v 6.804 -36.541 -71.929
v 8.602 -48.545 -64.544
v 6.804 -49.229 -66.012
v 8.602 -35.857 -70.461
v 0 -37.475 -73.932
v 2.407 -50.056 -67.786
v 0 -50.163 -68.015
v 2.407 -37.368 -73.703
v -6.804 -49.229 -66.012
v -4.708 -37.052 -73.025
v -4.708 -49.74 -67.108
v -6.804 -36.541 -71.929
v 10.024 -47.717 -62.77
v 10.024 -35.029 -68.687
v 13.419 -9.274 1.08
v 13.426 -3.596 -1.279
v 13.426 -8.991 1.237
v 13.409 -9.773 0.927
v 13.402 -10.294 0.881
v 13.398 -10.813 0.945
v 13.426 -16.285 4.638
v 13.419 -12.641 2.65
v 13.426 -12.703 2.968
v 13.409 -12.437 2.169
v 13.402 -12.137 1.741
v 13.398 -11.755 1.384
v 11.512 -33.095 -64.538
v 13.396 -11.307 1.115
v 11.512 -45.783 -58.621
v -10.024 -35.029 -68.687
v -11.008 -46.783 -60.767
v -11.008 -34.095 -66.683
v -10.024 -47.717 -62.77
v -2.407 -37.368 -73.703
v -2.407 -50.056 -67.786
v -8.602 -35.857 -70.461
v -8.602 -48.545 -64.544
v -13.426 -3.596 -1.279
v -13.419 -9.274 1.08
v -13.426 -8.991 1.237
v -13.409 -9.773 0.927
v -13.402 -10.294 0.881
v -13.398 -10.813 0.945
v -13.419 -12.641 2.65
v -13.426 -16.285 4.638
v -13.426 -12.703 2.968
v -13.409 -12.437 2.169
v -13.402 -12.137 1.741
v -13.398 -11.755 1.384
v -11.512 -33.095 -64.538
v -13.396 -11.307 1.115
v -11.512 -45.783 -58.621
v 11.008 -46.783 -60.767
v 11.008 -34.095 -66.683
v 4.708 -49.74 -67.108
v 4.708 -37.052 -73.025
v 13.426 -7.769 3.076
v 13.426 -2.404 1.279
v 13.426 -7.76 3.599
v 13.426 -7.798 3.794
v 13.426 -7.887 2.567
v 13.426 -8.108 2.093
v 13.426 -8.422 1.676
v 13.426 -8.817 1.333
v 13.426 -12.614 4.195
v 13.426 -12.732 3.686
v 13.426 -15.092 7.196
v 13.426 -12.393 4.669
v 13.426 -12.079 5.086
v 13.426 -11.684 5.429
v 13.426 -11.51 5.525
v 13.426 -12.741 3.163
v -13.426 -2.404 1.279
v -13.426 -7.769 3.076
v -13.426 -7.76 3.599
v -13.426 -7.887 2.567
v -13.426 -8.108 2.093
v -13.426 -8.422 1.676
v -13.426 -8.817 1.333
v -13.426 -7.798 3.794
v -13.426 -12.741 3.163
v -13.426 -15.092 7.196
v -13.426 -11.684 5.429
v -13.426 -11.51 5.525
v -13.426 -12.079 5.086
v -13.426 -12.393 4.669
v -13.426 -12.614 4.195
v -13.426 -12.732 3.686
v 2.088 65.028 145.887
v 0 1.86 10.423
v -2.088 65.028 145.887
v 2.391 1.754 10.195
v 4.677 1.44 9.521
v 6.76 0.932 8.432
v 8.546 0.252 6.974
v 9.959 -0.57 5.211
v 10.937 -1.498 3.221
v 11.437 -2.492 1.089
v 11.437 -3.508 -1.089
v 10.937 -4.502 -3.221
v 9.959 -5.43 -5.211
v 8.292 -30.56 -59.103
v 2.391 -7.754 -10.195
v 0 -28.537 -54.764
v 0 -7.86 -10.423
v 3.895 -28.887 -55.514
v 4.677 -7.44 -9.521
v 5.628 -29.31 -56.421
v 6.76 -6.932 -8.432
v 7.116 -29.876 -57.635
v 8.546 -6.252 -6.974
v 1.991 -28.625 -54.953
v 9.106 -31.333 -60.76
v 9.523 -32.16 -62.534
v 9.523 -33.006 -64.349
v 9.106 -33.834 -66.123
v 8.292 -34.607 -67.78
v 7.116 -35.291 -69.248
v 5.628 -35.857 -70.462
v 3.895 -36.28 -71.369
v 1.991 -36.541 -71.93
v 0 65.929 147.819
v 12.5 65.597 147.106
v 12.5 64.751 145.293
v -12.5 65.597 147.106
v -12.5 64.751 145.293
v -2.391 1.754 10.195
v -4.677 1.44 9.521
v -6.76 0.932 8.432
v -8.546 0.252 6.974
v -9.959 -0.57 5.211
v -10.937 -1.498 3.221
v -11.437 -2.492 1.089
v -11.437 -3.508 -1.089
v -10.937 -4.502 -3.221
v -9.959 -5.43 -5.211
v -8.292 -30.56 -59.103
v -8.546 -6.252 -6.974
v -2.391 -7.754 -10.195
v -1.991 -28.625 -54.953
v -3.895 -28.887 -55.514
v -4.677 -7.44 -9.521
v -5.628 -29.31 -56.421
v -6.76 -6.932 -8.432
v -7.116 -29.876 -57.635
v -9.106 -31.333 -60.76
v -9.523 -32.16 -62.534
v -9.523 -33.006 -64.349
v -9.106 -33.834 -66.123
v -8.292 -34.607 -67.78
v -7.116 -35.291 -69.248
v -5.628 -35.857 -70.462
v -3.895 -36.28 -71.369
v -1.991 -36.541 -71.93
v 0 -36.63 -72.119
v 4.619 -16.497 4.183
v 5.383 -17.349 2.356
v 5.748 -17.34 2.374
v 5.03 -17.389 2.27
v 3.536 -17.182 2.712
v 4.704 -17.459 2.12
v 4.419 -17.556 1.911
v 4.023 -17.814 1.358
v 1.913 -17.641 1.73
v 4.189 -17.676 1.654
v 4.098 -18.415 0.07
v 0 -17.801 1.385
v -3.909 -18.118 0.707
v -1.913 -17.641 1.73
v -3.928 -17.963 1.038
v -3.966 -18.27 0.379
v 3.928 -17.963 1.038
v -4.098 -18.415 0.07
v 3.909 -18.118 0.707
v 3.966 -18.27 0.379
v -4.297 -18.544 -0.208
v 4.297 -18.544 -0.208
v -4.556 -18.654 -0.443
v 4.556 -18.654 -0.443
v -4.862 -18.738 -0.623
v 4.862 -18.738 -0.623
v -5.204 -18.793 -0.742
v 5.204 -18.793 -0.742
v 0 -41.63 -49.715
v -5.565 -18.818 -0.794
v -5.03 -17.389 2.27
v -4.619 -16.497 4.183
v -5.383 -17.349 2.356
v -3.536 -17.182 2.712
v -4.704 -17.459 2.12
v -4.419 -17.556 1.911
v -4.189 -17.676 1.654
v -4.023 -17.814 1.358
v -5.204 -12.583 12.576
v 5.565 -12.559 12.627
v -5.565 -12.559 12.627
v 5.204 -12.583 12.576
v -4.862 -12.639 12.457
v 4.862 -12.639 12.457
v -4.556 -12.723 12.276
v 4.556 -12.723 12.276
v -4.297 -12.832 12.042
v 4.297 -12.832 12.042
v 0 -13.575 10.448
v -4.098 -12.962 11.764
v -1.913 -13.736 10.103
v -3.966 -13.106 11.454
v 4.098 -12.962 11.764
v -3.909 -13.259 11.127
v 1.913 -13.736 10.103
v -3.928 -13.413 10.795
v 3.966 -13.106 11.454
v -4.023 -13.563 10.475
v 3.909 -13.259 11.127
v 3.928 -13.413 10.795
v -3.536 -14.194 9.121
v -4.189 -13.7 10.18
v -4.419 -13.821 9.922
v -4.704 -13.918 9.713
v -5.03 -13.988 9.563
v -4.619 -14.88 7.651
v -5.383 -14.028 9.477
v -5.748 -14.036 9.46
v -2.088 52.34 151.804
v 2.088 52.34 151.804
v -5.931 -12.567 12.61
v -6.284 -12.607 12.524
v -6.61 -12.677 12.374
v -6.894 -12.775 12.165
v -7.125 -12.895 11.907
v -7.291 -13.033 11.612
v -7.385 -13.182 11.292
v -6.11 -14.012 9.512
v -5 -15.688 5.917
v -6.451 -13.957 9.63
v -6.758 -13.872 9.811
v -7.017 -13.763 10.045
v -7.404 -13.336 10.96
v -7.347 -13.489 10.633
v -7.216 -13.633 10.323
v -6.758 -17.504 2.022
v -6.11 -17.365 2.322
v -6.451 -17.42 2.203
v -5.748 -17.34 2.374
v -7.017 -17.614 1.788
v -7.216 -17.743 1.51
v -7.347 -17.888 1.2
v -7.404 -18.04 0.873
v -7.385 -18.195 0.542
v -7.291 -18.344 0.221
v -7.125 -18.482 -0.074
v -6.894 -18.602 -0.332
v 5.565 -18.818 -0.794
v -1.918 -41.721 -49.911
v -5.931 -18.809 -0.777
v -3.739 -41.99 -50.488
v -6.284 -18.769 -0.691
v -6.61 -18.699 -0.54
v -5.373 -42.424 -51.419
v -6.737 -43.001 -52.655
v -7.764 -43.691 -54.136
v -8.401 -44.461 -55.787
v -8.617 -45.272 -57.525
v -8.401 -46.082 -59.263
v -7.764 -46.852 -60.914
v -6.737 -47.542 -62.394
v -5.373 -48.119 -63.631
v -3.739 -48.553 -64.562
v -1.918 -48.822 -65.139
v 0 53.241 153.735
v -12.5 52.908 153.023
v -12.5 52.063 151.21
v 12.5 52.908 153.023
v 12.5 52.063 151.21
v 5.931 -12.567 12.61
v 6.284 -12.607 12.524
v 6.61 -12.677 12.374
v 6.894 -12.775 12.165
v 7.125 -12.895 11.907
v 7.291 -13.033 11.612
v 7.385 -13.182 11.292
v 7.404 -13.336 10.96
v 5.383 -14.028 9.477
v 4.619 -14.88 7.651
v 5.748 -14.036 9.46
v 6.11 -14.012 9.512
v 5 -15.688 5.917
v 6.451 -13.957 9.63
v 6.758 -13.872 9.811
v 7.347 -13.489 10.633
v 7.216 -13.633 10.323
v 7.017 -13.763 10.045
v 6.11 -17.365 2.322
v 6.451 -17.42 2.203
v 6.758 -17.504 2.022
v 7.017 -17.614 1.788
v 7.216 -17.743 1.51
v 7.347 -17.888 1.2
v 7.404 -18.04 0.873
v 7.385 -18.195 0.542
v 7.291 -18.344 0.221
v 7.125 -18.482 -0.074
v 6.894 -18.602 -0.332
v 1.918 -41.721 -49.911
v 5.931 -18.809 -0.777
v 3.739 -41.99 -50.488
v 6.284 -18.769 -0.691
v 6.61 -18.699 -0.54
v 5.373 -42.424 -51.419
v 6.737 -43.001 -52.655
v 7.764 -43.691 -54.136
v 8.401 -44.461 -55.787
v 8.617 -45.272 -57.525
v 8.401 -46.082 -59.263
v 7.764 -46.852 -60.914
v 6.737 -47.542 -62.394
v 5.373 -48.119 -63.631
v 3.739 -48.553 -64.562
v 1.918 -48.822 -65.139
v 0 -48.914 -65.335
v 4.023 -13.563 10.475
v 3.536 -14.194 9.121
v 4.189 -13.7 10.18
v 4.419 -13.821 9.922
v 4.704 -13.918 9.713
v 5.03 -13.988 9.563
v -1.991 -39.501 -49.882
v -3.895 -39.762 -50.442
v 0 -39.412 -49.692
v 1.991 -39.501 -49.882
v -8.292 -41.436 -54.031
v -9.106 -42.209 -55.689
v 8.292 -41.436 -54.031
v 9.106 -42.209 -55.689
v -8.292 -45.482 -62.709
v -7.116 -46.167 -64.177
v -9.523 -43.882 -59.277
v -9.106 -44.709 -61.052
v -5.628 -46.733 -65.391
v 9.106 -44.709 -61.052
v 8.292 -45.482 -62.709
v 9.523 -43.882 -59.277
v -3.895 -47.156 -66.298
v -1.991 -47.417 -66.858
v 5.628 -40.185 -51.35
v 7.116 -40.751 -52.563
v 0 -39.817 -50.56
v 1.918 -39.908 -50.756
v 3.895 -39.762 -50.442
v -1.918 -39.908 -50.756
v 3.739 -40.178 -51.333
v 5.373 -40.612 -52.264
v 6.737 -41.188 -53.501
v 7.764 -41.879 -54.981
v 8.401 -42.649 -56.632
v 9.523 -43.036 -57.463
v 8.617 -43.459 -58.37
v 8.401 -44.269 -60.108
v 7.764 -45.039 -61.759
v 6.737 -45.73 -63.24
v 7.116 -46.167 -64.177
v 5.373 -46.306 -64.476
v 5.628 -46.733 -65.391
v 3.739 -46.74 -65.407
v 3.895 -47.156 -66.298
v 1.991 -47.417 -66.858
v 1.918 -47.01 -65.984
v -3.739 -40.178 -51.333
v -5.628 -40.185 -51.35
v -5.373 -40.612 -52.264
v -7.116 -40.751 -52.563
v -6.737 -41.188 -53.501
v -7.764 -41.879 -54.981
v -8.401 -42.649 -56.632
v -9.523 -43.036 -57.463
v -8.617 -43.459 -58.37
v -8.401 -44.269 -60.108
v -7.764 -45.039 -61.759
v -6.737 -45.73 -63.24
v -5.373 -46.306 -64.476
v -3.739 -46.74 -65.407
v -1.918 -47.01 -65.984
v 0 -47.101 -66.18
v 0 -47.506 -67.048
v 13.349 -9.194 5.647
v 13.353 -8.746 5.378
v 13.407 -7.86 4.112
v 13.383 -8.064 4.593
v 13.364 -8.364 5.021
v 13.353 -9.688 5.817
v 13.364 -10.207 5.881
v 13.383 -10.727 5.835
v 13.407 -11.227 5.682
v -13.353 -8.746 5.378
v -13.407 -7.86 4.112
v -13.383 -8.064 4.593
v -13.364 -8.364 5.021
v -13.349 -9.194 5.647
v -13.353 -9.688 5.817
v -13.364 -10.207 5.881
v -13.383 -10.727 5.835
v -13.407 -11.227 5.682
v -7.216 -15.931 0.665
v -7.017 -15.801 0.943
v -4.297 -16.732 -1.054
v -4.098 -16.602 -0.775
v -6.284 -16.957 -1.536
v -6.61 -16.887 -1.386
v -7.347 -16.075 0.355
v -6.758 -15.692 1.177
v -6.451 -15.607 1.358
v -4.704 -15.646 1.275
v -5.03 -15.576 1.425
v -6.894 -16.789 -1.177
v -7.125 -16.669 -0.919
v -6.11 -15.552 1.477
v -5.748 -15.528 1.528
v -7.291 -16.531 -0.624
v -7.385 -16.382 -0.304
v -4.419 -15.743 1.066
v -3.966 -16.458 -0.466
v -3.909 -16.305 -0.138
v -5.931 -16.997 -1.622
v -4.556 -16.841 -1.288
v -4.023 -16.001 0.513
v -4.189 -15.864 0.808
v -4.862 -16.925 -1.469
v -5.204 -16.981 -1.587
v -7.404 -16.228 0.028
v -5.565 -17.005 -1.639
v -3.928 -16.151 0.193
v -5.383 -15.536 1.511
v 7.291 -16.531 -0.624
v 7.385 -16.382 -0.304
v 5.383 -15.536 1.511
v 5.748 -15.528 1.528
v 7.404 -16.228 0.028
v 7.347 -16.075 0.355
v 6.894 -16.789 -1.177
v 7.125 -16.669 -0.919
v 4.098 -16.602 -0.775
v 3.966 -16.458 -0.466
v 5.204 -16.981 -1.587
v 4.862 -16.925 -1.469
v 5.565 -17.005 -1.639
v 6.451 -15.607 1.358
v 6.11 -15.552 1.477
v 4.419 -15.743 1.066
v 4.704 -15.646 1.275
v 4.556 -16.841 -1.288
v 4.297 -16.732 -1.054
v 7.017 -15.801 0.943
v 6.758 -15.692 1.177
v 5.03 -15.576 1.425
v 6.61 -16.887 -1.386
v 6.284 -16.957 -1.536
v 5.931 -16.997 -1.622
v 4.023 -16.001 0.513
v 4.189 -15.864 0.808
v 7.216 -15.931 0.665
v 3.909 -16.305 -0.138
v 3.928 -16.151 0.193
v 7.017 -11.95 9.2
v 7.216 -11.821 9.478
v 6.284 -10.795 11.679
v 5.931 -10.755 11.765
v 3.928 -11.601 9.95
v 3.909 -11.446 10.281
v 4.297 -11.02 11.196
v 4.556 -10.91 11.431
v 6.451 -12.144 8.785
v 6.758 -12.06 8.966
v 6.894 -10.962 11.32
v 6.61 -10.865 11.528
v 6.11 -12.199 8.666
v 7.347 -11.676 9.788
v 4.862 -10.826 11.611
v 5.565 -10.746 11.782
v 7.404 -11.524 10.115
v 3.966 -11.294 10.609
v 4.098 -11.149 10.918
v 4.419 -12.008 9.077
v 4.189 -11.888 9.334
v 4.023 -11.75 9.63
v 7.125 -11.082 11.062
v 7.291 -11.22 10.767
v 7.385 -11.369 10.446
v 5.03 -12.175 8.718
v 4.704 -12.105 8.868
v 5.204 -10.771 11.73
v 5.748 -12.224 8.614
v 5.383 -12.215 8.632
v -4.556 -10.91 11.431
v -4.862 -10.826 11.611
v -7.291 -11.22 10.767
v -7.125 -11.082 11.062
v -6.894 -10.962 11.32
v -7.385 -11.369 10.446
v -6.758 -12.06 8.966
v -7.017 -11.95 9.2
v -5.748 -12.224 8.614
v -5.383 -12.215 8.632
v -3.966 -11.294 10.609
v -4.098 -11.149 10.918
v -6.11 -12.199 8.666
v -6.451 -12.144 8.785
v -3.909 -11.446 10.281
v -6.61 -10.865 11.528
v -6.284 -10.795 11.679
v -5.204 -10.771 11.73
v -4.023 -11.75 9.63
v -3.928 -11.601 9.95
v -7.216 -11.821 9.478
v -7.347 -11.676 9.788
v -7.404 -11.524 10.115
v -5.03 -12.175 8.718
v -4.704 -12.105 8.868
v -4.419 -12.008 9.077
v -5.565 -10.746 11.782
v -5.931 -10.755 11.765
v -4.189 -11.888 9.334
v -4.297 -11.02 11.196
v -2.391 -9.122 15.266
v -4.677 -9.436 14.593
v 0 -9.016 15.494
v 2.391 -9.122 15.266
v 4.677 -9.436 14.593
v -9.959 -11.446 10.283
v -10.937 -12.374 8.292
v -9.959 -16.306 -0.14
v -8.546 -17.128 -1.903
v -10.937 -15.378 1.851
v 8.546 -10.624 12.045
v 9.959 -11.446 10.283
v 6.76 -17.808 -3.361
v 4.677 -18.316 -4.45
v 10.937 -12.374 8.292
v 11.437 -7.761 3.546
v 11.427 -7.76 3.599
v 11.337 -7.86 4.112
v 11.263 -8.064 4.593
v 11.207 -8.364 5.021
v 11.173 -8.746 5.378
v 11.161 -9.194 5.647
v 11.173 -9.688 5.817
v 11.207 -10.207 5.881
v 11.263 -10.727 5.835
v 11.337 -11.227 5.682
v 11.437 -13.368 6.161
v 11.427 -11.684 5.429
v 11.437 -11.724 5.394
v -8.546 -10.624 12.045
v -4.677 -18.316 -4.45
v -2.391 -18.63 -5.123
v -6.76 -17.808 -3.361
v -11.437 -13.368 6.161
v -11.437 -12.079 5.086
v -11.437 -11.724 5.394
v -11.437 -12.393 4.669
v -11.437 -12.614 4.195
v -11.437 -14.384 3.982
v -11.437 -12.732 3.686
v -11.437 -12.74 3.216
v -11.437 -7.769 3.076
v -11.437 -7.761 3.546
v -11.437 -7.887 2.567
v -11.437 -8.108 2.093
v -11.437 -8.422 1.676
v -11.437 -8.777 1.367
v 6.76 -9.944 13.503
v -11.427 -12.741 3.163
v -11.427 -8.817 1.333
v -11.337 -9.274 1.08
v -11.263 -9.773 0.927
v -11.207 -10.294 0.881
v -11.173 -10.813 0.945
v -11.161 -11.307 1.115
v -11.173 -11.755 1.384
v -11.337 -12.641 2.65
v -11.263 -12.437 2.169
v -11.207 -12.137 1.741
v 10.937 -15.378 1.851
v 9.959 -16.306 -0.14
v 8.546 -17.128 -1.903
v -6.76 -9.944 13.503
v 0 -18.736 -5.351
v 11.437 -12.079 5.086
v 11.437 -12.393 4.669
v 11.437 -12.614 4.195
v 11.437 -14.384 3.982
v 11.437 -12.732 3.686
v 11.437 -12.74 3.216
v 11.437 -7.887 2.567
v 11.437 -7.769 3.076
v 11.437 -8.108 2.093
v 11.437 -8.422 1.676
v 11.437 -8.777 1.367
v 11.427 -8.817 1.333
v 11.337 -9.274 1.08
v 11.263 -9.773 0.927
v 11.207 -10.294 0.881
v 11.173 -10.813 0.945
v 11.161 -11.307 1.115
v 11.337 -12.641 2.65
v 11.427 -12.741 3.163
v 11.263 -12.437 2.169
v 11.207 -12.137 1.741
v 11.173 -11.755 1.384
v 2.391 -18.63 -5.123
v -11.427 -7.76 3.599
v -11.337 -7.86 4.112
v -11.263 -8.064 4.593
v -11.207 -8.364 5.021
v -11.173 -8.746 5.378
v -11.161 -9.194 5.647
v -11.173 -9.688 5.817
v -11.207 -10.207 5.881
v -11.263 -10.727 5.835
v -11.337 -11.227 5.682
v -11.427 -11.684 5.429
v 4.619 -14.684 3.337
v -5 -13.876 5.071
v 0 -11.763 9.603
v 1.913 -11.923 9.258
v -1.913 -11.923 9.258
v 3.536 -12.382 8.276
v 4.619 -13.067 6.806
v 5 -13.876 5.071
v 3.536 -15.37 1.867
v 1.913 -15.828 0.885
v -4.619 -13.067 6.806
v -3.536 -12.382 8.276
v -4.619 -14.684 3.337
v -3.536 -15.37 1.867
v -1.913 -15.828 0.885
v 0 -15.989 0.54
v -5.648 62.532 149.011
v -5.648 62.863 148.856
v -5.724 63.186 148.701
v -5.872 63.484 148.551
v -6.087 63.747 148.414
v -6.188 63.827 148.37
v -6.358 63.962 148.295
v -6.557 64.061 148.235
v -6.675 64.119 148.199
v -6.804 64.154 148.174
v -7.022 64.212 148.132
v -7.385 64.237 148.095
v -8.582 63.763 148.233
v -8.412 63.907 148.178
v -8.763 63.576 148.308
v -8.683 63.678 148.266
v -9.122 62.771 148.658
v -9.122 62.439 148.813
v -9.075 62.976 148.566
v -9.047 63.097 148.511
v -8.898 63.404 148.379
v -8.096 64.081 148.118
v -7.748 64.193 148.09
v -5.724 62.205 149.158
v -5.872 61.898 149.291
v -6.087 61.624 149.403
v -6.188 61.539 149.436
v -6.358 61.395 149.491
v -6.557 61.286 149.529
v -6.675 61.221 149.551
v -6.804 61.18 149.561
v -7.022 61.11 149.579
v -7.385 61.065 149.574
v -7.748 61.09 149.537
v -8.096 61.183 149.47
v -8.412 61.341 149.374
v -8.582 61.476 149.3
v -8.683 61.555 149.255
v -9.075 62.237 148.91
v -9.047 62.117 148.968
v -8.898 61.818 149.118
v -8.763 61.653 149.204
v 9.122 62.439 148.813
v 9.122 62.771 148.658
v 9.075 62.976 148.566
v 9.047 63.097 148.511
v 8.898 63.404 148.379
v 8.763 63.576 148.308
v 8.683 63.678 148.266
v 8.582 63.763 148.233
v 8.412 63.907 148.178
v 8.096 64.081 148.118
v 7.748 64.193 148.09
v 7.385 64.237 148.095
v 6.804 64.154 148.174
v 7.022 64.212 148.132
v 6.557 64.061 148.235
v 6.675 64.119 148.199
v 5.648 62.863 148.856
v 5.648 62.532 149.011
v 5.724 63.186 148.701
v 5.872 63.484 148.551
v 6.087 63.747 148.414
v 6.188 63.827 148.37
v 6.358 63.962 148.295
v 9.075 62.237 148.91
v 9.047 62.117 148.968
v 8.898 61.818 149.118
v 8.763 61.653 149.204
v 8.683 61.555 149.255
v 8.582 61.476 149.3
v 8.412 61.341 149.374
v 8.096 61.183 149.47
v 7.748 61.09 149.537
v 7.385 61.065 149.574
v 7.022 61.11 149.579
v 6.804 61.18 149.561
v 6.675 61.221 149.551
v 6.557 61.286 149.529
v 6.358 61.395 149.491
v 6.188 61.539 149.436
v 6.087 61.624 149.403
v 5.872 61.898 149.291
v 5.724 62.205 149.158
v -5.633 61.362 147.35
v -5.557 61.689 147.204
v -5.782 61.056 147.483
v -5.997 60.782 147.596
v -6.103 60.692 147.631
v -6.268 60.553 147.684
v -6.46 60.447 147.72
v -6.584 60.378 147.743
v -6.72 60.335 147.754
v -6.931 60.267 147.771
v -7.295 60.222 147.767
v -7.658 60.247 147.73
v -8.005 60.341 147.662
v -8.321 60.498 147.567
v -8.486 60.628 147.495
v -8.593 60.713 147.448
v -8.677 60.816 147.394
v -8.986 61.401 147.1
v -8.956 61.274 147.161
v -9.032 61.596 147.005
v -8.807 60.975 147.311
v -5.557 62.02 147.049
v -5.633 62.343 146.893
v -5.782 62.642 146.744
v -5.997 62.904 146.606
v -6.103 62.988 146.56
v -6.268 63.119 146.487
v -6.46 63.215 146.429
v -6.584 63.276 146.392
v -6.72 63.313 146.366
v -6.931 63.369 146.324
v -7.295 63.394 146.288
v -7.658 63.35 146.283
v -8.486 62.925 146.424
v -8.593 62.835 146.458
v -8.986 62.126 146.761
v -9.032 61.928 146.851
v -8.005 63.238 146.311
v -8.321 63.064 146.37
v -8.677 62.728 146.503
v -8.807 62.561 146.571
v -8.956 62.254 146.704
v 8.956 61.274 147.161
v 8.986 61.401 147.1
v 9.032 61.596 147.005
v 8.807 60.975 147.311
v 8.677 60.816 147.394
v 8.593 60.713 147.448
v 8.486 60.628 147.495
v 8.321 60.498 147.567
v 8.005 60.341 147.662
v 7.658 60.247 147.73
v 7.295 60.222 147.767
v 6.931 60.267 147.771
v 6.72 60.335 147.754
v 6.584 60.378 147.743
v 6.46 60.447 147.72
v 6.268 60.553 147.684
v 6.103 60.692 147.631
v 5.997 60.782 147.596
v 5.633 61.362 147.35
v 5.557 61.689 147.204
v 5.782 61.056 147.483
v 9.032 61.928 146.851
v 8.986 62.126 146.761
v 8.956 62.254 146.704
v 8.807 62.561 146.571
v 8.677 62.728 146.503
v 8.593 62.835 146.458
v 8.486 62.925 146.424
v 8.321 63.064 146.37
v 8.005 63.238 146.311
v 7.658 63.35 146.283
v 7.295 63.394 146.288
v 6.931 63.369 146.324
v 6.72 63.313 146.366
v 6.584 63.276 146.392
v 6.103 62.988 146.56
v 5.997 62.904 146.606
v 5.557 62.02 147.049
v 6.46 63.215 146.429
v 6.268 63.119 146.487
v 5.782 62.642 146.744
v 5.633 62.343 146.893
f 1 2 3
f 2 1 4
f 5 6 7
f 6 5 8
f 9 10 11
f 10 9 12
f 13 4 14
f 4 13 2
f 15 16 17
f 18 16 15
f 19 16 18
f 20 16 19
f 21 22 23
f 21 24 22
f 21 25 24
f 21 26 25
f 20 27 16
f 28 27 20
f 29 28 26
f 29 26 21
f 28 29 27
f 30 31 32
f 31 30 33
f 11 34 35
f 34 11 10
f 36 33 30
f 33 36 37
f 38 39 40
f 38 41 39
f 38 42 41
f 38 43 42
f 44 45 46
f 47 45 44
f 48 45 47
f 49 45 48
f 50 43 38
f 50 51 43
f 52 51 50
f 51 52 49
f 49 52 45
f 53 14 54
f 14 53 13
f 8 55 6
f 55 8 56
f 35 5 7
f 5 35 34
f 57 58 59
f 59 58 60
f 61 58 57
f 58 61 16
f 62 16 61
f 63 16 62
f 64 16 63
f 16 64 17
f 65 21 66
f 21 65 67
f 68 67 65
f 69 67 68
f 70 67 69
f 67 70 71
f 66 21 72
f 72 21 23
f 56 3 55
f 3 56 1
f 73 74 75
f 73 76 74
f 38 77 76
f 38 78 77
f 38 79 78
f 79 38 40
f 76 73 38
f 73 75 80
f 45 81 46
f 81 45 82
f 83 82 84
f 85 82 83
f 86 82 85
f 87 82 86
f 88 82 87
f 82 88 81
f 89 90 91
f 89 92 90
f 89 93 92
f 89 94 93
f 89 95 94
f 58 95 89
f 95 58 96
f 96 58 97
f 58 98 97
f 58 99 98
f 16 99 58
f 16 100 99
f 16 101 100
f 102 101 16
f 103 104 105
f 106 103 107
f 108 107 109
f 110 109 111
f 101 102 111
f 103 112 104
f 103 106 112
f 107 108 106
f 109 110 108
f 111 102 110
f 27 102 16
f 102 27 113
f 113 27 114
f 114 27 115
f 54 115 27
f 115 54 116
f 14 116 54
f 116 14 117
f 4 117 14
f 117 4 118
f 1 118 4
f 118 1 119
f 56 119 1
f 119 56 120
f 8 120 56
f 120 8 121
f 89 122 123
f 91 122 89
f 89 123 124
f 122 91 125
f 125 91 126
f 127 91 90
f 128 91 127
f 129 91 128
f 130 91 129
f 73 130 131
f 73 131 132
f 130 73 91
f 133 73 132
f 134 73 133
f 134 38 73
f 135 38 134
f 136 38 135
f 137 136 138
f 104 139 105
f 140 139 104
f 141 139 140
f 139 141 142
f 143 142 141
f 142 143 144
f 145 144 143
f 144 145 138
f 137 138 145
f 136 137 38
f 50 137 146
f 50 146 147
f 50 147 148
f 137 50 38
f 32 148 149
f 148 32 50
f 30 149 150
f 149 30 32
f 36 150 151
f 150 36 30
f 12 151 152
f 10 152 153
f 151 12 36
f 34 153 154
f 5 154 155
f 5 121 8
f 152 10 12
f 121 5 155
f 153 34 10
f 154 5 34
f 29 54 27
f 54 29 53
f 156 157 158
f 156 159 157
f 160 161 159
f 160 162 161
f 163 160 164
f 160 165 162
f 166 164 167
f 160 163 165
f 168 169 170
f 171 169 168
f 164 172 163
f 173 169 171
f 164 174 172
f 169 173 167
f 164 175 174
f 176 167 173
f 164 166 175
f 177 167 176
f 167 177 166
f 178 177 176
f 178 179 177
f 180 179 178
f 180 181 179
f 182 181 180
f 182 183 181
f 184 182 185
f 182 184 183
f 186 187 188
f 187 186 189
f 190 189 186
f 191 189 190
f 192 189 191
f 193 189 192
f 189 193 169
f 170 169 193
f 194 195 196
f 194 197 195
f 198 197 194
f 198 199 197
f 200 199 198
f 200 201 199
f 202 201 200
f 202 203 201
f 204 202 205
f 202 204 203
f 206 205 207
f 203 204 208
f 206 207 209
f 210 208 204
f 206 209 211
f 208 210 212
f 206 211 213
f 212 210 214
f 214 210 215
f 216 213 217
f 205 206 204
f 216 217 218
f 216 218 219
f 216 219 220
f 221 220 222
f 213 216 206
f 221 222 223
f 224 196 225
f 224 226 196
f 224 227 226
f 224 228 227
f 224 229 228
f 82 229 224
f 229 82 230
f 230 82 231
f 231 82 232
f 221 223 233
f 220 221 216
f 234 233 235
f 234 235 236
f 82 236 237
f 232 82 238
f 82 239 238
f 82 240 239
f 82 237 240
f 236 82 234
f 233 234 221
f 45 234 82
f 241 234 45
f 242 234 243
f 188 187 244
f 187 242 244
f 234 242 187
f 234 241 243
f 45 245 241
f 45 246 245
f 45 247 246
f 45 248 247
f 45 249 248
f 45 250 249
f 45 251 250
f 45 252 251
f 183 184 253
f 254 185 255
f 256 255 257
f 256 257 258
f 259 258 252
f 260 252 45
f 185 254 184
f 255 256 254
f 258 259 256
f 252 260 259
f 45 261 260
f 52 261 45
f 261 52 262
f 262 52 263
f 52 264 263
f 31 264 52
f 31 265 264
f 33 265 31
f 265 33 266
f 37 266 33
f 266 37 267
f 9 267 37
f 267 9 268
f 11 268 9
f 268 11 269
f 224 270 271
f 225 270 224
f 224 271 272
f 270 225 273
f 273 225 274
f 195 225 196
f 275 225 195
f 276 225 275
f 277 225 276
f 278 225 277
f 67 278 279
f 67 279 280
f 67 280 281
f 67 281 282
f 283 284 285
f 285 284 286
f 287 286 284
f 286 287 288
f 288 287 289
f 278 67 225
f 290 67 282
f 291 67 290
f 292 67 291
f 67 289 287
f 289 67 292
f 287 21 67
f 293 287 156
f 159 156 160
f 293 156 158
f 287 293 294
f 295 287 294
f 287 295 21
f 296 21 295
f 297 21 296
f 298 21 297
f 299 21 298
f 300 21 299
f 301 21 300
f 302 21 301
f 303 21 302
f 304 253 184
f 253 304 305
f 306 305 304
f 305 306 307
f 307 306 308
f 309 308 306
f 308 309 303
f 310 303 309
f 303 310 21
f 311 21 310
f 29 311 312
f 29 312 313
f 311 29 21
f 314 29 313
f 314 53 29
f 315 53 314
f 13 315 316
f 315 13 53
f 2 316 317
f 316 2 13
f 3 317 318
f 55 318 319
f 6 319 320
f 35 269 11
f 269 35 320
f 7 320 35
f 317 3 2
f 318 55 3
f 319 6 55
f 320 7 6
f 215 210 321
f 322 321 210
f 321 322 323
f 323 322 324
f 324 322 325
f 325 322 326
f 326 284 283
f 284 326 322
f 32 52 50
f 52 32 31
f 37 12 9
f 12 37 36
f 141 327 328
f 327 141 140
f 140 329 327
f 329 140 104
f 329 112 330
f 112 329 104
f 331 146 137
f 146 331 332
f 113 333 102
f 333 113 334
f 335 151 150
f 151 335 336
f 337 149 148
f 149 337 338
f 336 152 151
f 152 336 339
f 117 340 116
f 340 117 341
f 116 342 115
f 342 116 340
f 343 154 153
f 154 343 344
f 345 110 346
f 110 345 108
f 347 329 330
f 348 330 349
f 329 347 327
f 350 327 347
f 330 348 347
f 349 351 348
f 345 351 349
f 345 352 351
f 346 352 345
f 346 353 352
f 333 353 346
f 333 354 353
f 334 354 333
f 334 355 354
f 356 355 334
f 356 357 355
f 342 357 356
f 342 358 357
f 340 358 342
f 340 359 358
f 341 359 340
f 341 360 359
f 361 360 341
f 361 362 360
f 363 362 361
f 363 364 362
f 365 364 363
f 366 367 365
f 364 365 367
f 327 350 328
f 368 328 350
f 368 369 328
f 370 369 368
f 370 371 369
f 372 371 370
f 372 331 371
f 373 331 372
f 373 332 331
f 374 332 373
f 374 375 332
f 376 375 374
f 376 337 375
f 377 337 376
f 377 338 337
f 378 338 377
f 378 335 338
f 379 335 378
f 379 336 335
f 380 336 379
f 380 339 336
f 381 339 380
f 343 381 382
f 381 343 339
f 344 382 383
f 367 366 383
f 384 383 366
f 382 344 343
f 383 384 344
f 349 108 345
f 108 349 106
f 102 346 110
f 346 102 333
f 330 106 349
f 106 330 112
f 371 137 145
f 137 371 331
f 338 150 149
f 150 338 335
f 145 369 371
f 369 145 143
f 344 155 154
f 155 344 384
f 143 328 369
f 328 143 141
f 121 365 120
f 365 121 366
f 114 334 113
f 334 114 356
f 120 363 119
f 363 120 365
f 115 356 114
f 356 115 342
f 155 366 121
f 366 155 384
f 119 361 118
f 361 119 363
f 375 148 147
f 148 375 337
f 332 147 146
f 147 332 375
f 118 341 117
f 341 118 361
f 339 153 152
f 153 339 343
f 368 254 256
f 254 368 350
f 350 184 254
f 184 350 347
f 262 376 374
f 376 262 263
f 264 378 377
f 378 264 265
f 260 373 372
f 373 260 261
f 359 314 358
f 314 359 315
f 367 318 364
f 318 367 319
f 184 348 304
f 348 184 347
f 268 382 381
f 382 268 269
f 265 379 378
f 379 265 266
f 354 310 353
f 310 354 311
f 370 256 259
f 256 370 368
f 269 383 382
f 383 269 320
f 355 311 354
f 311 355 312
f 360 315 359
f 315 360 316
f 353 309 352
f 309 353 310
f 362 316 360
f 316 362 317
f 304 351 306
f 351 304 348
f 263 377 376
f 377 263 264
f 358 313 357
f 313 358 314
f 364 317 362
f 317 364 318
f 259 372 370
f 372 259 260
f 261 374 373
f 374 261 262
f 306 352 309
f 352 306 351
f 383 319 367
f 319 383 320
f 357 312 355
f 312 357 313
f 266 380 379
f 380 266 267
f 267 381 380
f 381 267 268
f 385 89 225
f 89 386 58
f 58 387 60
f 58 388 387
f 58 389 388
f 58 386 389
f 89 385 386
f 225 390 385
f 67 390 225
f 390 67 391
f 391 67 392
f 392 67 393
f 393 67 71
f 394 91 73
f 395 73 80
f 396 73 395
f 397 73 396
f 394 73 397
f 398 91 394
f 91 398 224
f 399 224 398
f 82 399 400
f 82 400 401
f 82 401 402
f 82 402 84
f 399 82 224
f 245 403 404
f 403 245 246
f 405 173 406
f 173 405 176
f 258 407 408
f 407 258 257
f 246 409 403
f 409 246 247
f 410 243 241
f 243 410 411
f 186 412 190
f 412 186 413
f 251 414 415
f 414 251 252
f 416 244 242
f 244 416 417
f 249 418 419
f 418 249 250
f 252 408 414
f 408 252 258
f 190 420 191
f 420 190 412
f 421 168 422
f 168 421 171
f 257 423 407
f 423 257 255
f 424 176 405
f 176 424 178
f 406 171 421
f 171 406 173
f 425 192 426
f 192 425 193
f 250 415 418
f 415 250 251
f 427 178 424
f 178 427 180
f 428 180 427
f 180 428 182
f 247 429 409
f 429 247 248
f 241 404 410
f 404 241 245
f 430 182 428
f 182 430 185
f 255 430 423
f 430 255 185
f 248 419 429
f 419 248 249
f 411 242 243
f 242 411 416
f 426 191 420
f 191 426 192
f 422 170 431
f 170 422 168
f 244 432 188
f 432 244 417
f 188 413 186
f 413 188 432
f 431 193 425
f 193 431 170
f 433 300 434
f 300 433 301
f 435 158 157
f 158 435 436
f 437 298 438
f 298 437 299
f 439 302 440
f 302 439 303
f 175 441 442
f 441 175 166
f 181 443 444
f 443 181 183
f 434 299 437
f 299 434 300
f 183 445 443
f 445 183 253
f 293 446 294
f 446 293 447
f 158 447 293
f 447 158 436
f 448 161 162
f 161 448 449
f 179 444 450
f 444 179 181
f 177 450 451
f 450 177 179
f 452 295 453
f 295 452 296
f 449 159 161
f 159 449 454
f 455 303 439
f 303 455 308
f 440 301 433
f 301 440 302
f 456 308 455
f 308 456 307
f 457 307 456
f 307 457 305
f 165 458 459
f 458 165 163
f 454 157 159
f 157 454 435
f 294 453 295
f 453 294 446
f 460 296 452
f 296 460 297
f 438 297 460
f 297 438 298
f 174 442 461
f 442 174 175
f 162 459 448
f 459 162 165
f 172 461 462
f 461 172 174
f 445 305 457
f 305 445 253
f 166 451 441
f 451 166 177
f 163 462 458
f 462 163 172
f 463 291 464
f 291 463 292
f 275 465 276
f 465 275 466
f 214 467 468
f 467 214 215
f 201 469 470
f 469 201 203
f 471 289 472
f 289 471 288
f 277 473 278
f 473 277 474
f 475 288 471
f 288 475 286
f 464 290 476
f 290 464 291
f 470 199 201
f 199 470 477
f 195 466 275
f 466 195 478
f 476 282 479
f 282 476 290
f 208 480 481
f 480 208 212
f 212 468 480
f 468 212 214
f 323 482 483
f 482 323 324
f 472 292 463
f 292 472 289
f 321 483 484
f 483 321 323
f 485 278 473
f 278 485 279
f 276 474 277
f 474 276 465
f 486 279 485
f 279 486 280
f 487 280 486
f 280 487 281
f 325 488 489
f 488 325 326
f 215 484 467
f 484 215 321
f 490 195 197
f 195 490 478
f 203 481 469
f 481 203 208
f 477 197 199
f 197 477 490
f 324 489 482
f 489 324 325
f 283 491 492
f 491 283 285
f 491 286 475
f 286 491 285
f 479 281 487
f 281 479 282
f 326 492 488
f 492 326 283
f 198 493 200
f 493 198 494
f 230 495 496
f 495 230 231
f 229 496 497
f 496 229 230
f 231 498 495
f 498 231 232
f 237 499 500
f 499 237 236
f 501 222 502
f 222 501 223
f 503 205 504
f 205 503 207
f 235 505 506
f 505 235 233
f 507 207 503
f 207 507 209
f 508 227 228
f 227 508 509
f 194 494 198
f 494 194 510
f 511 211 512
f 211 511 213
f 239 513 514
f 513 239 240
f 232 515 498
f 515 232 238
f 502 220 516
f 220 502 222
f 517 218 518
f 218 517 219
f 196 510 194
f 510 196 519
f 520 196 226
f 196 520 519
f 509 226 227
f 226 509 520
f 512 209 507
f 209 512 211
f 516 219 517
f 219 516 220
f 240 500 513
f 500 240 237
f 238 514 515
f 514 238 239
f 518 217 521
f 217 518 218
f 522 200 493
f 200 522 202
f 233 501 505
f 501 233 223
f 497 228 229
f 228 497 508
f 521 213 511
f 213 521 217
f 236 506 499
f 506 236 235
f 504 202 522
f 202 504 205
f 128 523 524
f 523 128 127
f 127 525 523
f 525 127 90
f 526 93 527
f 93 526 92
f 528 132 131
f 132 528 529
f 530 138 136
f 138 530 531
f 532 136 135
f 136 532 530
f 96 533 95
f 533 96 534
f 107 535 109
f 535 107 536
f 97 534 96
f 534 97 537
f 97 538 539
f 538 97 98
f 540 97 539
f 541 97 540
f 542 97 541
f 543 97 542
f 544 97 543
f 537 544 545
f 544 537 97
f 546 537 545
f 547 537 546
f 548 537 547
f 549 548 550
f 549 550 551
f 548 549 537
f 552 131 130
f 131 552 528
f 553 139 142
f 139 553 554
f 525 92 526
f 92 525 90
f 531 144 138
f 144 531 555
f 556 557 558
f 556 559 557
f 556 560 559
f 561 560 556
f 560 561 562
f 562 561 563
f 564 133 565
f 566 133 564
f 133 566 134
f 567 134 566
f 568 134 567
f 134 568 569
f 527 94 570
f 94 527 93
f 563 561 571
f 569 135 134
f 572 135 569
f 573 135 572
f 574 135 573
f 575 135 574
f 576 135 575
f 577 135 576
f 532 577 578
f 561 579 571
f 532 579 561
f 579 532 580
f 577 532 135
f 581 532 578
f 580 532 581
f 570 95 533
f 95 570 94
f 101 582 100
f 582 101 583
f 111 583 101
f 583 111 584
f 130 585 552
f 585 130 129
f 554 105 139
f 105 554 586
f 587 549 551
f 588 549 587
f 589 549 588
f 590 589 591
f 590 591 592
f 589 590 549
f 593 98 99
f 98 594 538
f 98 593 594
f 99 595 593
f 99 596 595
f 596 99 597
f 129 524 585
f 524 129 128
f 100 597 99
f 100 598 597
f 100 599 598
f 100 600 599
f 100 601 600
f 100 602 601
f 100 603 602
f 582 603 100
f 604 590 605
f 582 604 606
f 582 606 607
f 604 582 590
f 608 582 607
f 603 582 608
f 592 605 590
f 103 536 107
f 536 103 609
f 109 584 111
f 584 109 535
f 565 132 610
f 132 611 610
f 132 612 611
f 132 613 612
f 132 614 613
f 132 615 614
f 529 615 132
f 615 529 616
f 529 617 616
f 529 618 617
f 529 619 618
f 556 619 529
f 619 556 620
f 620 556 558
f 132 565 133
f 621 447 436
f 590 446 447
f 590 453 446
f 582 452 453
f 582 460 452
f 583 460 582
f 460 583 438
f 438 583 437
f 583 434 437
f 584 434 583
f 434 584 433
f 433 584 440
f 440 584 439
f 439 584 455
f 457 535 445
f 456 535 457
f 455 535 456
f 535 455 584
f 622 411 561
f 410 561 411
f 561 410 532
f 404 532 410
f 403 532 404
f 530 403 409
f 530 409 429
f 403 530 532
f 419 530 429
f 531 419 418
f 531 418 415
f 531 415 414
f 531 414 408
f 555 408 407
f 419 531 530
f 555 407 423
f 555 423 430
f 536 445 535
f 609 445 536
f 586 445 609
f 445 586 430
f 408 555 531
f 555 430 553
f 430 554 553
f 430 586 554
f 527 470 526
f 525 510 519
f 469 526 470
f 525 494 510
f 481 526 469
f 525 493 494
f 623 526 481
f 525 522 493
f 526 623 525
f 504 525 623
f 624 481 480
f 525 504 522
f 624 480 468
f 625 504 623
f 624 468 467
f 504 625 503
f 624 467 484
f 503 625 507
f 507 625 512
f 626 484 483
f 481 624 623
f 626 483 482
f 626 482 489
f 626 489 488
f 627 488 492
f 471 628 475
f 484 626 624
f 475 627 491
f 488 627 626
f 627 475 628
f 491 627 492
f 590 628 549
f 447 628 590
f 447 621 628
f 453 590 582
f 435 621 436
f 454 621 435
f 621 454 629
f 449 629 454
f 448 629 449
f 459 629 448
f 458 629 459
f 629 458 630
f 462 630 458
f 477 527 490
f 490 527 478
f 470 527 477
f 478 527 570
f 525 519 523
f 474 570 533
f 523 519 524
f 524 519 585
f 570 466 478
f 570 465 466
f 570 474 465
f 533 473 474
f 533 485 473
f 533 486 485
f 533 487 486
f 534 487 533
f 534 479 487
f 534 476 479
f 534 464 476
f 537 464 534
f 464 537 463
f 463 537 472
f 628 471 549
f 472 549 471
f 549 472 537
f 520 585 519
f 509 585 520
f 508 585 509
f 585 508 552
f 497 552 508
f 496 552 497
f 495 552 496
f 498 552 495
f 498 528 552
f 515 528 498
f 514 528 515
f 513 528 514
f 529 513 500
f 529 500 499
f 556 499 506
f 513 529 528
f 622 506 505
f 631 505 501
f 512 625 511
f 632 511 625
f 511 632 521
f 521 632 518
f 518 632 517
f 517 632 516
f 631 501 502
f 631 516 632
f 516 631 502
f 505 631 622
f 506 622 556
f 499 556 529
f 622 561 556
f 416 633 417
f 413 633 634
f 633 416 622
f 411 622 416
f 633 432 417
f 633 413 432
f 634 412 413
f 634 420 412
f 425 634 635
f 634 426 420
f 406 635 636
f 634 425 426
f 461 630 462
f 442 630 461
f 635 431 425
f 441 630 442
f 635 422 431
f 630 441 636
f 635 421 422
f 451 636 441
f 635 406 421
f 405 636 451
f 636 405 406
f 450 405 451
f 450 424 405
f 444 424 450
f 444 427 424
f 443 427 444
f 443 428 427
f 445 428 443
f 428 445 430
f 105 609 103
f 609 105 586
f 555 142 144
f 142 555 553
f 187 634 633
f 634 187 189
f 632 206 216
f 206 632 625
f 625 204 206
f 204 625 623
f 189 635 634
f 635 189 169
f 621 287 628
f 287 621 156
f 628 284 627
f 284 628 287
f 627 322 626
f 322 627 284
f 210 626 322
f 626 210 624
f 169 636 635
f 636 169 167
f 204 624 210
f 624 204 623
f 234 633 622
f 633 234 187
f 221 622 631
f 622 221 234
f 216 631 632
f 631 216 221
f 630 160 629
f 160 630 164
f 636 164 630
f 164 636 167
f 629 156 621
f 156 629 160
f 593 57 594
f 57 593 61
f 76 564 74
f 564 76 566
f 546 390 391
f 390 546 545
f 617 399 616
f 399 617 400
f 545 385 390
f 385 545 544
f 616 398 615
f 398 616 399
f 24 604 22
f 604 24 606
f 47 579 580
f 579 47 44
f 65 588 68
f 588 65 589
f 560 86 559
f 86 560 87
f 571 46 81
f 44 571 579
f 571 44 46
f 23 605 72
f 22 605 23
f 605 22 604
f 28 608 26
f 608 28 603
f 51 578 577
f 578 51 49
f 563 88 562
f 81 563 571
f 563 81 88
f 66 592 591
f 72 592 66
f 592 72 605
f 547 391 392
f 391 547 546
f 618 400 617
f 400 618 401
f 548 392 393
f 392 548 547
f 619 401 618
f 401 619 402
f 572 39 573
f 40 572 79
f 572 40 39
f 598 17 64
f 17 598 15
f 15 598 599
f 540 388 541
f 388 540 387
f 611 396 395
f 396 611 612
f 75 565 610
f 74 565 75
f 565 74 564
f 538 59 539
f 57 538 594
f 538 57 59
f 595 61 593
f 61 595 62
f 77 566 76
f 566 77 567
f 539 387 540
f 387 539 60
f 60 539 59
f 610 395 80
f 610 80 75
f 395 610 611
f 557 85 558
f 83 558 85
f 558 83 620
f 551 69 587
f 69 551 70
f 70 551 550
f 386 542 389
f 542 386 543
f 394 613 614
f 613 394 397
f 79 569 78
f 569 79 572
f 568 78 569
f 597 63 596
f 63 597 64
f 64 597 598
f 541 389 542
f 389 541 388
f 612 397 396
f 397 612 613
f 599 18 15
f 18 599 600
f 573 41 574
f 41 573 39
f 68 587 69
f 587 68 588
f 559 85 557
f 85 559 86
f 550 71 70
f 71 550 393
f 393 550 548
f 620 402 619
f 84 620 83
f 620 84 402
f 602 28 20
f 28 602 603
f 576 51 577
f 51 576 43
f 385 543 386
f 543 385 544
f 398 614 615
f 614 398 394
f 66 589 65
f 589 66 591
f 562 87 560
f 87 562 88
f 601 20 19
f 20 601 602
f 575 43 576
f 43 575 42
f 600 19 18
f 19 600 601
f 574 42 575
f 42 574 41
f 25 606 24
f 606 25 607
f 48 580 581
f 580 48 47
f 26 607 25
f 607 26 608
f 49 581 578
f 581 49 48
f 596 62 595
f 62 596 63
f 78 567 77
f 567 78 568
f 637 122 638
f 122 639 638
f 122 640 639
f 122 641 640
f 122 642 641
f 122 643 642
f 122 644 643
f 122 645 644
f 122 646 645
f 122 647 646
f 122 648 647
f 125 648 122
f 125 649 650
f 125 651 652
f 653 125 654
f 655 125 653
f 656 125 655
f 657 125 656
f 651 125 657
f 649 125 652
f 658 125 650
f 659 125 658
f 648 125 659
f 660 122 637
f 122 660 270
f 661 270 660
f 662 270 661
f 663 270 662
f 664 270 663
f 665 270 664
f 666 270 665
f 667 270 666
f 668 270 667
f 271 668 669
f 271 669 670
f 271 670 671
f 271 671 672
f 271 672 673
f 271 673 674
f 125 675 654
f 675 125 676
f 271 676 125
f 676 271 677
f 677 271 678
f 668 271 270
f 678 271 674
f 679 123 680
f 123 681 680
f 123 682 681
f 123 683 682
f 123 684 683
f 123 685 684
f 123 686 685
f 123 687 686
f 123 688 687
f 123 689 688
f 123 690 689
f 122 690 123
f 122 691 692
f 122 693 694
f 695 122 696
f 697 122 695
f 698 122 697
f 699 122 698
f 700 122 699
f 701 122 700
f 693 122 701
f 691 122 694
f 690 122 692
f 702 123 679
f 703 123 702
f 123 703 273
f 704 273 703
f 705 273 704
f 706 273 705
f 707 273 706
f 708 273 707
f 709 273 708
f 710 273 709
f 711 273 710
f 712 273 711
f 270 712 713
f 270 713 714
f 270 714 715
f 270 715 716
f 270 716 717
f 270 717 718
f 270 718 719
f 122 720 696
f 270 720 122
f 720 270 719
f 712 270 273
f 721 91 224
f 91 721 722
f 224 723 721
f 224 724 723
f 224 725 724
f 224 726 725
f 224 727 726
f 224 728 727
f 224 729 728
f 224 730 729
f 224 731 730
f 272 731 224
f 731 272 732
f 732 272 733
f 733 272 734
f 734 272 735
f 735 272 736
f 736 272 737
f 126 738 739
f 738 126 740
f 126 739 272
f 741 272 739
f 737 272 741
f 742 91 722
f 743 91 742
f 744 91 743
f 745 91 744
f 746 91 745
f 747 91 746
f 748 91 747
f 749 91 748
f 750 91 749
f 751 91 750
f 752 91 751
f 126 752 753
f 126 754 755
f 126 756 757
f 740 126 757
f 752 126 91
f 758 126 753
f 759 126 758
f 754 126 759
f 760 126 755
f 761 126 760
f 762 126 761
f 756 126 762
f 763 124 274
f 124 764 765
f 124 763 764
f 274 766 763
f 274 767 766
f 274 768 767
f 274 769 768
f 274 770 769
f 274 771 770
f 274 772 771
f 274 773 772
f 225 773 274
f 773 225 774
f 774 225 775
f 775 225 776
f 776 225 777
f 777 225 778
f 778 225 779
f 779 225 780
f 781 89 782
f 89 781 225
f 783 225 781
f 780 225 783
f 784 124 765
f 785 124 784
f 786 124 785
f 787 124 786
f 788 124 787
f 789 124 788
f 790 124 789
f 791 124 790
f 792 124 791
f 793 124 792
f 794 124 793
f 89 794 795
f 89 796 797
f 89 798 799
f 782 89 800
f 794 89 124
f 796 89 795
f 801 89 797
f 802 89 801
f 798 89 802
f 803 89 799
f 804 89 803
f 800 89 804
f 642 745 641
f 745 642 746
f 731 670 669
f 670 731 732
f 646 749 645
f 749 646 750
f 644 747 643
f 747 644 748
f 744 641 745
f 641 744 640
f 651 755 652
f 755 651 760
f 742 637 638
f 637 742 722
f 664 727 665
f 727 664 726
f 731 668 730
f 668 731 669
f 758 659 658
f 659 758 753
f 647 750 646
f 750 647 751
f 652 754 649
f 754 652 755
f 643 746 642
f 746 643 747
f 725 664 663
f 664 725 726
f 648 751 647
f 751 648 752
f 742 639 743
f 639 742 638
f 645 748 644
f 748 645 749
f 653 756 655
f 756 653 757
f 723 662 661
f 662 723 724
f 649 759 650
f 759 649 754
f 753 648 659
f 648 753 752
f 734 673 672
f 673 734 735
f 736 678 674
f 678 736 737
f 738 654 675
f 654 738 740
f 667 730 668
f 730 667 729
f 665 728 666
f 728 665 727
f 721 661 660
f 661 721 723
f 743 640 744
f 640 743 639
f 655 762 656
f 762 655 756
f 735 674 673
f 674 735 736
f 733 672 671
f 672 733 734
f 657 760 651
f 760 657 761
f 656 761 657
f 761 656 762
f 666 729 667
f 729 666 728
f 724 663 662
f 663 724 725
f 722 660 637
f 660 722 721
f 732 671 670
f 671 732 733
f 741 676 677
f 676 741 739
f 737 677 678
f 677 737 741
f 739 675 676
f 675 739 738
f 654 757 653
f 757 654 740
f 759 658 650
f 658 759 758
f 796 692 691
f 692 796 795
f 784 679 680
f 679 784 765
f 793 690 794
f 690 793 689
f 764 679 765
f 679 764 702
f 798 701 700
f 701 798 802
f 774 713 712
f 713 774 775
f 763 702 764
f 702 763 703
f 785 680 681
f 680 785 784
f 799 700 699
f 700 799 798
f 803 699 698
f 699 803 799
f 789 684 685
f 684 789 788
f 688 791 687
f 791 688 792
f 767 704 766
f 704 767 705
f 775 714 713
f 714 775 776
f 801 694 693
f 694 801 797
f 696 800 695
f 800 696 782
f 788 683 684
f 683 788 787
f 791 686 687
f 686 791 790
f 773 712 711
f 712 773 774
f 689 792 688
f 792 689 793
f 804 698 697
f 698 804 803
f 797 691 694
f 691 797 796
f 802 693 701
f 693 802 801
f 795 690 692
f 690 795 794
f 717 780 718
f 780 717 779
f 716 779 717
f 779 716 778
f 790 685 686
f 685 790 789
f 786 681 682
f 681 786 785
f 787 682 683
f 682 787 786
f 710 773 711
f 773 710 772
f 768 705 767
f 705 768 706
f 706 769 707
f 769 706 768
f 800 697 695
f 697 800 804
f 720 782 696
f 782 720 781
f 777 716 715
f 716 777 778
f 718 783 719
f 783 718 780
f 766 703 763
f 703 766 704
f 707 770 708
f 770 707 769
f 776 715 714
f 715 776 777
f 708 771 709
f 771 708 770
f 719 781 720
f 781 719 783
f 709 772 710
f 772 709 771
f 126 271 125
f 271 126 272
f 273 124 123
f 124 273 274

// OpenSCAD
// file: aov_arm.scad
inch = 25.4;

globe_d = 13 * inch;
globe_r = globe_d/2;
globe_thickness = 2;
globe_ir = globe_r - globe_thickness;


height = 14;

RR = 70;
rr = RR - 40;
dd = 8; // magnet support offset from globe_ir

flange_d = 23;
um3_tol = .1;
penny_d = .75 * inch + um3_tol;
penny_t = .06 * inch;

module penny_compartment(dd){
  difference(){
    hull(){
      translate([0,0,0])cylinder(d=flange_d + 4, h=height);
      translate([-dd,0,0])cylinder(d=penny_d + 4, h=height);
    }
    translate([0,0,-2])translate([-dd,0,0])cylinder(d=penny_d, h=height);
    translate([0,0,-2])translate([-dd,0,0])cylinder(d=penny_d * .9, h=height * 2);
  }
  difference(){
    cylinder(d=flange_d + 4, h=.2);
    translate([0,0,-1])cylinder(d=penny_d - .2, h=3);
  }
}

module aov_arm(){
  rotate([0,0,180]){
    difference(){
      union(){
	hull(){
	  cylinder(d=flange_d + 4, h=height);
	  translate([globe_ir-1,-2,0])cube([.1,4,height]);
	}
	penny_compartment(70);
      }
      translate([0,0,-1])cylinder(h=height-1, d=flange_d);
      translate([0,0,-1])cylinder(h=height*2, d=10);
      for(i=[1:4]){
	rotate([0,0,45 + 90 * i])translate([8,0,0])cylinder(d=3.5, h=30, $fn=30);
      }
      translate([0,0,8])rotate([90,0,0])cylinder(d=5, h=40, $fn=30, center=true);
    }

    intersection(){
      difference(){
	cylinder(r=globe_ir, h=height, $fn=50);
	translate([0,0,-1])cylinder(r=globe_ir-2, h=height+2, $fn=50);
	rotate([90,0,0])translate([0,8,0])cylinder(d=5, h=30, $fn=30);
	rotate([0, 0, 180+2.6])translate([-200, 0, 3.4])
	  rotate([0, 90, 0])cylinder(d=3.5, h=100, $fn=30);
	rotate([0, 0, 180-2.6])translate([-200, 0, 3.4])
	  rotate([0, 90, 0])cylinder(d=3.5, h=100, $fn=30);
      }
      translate([100,0,0])cube([200, 25, 100], center=true);
    }
  }
}
aov_arm();
//penny_compartment(0);
// main file
// Render aov_arm in its assembly position
// Export with: openscad -o stls_in_situ/aov_arm.stl render_aov_arm.scad

use <aov_arm.scad>

// Assembly parameters (from full_assembly.scad line 382)
inc = 65;
aov = 90;

// Full transformation chain from aov_motor_assy module
translate([0, 0, -140])
  translate([0, -3, 140])
    rotate([inc, 0, 0])
      rotate([0, 0, aov-180])
        aov_arm();
